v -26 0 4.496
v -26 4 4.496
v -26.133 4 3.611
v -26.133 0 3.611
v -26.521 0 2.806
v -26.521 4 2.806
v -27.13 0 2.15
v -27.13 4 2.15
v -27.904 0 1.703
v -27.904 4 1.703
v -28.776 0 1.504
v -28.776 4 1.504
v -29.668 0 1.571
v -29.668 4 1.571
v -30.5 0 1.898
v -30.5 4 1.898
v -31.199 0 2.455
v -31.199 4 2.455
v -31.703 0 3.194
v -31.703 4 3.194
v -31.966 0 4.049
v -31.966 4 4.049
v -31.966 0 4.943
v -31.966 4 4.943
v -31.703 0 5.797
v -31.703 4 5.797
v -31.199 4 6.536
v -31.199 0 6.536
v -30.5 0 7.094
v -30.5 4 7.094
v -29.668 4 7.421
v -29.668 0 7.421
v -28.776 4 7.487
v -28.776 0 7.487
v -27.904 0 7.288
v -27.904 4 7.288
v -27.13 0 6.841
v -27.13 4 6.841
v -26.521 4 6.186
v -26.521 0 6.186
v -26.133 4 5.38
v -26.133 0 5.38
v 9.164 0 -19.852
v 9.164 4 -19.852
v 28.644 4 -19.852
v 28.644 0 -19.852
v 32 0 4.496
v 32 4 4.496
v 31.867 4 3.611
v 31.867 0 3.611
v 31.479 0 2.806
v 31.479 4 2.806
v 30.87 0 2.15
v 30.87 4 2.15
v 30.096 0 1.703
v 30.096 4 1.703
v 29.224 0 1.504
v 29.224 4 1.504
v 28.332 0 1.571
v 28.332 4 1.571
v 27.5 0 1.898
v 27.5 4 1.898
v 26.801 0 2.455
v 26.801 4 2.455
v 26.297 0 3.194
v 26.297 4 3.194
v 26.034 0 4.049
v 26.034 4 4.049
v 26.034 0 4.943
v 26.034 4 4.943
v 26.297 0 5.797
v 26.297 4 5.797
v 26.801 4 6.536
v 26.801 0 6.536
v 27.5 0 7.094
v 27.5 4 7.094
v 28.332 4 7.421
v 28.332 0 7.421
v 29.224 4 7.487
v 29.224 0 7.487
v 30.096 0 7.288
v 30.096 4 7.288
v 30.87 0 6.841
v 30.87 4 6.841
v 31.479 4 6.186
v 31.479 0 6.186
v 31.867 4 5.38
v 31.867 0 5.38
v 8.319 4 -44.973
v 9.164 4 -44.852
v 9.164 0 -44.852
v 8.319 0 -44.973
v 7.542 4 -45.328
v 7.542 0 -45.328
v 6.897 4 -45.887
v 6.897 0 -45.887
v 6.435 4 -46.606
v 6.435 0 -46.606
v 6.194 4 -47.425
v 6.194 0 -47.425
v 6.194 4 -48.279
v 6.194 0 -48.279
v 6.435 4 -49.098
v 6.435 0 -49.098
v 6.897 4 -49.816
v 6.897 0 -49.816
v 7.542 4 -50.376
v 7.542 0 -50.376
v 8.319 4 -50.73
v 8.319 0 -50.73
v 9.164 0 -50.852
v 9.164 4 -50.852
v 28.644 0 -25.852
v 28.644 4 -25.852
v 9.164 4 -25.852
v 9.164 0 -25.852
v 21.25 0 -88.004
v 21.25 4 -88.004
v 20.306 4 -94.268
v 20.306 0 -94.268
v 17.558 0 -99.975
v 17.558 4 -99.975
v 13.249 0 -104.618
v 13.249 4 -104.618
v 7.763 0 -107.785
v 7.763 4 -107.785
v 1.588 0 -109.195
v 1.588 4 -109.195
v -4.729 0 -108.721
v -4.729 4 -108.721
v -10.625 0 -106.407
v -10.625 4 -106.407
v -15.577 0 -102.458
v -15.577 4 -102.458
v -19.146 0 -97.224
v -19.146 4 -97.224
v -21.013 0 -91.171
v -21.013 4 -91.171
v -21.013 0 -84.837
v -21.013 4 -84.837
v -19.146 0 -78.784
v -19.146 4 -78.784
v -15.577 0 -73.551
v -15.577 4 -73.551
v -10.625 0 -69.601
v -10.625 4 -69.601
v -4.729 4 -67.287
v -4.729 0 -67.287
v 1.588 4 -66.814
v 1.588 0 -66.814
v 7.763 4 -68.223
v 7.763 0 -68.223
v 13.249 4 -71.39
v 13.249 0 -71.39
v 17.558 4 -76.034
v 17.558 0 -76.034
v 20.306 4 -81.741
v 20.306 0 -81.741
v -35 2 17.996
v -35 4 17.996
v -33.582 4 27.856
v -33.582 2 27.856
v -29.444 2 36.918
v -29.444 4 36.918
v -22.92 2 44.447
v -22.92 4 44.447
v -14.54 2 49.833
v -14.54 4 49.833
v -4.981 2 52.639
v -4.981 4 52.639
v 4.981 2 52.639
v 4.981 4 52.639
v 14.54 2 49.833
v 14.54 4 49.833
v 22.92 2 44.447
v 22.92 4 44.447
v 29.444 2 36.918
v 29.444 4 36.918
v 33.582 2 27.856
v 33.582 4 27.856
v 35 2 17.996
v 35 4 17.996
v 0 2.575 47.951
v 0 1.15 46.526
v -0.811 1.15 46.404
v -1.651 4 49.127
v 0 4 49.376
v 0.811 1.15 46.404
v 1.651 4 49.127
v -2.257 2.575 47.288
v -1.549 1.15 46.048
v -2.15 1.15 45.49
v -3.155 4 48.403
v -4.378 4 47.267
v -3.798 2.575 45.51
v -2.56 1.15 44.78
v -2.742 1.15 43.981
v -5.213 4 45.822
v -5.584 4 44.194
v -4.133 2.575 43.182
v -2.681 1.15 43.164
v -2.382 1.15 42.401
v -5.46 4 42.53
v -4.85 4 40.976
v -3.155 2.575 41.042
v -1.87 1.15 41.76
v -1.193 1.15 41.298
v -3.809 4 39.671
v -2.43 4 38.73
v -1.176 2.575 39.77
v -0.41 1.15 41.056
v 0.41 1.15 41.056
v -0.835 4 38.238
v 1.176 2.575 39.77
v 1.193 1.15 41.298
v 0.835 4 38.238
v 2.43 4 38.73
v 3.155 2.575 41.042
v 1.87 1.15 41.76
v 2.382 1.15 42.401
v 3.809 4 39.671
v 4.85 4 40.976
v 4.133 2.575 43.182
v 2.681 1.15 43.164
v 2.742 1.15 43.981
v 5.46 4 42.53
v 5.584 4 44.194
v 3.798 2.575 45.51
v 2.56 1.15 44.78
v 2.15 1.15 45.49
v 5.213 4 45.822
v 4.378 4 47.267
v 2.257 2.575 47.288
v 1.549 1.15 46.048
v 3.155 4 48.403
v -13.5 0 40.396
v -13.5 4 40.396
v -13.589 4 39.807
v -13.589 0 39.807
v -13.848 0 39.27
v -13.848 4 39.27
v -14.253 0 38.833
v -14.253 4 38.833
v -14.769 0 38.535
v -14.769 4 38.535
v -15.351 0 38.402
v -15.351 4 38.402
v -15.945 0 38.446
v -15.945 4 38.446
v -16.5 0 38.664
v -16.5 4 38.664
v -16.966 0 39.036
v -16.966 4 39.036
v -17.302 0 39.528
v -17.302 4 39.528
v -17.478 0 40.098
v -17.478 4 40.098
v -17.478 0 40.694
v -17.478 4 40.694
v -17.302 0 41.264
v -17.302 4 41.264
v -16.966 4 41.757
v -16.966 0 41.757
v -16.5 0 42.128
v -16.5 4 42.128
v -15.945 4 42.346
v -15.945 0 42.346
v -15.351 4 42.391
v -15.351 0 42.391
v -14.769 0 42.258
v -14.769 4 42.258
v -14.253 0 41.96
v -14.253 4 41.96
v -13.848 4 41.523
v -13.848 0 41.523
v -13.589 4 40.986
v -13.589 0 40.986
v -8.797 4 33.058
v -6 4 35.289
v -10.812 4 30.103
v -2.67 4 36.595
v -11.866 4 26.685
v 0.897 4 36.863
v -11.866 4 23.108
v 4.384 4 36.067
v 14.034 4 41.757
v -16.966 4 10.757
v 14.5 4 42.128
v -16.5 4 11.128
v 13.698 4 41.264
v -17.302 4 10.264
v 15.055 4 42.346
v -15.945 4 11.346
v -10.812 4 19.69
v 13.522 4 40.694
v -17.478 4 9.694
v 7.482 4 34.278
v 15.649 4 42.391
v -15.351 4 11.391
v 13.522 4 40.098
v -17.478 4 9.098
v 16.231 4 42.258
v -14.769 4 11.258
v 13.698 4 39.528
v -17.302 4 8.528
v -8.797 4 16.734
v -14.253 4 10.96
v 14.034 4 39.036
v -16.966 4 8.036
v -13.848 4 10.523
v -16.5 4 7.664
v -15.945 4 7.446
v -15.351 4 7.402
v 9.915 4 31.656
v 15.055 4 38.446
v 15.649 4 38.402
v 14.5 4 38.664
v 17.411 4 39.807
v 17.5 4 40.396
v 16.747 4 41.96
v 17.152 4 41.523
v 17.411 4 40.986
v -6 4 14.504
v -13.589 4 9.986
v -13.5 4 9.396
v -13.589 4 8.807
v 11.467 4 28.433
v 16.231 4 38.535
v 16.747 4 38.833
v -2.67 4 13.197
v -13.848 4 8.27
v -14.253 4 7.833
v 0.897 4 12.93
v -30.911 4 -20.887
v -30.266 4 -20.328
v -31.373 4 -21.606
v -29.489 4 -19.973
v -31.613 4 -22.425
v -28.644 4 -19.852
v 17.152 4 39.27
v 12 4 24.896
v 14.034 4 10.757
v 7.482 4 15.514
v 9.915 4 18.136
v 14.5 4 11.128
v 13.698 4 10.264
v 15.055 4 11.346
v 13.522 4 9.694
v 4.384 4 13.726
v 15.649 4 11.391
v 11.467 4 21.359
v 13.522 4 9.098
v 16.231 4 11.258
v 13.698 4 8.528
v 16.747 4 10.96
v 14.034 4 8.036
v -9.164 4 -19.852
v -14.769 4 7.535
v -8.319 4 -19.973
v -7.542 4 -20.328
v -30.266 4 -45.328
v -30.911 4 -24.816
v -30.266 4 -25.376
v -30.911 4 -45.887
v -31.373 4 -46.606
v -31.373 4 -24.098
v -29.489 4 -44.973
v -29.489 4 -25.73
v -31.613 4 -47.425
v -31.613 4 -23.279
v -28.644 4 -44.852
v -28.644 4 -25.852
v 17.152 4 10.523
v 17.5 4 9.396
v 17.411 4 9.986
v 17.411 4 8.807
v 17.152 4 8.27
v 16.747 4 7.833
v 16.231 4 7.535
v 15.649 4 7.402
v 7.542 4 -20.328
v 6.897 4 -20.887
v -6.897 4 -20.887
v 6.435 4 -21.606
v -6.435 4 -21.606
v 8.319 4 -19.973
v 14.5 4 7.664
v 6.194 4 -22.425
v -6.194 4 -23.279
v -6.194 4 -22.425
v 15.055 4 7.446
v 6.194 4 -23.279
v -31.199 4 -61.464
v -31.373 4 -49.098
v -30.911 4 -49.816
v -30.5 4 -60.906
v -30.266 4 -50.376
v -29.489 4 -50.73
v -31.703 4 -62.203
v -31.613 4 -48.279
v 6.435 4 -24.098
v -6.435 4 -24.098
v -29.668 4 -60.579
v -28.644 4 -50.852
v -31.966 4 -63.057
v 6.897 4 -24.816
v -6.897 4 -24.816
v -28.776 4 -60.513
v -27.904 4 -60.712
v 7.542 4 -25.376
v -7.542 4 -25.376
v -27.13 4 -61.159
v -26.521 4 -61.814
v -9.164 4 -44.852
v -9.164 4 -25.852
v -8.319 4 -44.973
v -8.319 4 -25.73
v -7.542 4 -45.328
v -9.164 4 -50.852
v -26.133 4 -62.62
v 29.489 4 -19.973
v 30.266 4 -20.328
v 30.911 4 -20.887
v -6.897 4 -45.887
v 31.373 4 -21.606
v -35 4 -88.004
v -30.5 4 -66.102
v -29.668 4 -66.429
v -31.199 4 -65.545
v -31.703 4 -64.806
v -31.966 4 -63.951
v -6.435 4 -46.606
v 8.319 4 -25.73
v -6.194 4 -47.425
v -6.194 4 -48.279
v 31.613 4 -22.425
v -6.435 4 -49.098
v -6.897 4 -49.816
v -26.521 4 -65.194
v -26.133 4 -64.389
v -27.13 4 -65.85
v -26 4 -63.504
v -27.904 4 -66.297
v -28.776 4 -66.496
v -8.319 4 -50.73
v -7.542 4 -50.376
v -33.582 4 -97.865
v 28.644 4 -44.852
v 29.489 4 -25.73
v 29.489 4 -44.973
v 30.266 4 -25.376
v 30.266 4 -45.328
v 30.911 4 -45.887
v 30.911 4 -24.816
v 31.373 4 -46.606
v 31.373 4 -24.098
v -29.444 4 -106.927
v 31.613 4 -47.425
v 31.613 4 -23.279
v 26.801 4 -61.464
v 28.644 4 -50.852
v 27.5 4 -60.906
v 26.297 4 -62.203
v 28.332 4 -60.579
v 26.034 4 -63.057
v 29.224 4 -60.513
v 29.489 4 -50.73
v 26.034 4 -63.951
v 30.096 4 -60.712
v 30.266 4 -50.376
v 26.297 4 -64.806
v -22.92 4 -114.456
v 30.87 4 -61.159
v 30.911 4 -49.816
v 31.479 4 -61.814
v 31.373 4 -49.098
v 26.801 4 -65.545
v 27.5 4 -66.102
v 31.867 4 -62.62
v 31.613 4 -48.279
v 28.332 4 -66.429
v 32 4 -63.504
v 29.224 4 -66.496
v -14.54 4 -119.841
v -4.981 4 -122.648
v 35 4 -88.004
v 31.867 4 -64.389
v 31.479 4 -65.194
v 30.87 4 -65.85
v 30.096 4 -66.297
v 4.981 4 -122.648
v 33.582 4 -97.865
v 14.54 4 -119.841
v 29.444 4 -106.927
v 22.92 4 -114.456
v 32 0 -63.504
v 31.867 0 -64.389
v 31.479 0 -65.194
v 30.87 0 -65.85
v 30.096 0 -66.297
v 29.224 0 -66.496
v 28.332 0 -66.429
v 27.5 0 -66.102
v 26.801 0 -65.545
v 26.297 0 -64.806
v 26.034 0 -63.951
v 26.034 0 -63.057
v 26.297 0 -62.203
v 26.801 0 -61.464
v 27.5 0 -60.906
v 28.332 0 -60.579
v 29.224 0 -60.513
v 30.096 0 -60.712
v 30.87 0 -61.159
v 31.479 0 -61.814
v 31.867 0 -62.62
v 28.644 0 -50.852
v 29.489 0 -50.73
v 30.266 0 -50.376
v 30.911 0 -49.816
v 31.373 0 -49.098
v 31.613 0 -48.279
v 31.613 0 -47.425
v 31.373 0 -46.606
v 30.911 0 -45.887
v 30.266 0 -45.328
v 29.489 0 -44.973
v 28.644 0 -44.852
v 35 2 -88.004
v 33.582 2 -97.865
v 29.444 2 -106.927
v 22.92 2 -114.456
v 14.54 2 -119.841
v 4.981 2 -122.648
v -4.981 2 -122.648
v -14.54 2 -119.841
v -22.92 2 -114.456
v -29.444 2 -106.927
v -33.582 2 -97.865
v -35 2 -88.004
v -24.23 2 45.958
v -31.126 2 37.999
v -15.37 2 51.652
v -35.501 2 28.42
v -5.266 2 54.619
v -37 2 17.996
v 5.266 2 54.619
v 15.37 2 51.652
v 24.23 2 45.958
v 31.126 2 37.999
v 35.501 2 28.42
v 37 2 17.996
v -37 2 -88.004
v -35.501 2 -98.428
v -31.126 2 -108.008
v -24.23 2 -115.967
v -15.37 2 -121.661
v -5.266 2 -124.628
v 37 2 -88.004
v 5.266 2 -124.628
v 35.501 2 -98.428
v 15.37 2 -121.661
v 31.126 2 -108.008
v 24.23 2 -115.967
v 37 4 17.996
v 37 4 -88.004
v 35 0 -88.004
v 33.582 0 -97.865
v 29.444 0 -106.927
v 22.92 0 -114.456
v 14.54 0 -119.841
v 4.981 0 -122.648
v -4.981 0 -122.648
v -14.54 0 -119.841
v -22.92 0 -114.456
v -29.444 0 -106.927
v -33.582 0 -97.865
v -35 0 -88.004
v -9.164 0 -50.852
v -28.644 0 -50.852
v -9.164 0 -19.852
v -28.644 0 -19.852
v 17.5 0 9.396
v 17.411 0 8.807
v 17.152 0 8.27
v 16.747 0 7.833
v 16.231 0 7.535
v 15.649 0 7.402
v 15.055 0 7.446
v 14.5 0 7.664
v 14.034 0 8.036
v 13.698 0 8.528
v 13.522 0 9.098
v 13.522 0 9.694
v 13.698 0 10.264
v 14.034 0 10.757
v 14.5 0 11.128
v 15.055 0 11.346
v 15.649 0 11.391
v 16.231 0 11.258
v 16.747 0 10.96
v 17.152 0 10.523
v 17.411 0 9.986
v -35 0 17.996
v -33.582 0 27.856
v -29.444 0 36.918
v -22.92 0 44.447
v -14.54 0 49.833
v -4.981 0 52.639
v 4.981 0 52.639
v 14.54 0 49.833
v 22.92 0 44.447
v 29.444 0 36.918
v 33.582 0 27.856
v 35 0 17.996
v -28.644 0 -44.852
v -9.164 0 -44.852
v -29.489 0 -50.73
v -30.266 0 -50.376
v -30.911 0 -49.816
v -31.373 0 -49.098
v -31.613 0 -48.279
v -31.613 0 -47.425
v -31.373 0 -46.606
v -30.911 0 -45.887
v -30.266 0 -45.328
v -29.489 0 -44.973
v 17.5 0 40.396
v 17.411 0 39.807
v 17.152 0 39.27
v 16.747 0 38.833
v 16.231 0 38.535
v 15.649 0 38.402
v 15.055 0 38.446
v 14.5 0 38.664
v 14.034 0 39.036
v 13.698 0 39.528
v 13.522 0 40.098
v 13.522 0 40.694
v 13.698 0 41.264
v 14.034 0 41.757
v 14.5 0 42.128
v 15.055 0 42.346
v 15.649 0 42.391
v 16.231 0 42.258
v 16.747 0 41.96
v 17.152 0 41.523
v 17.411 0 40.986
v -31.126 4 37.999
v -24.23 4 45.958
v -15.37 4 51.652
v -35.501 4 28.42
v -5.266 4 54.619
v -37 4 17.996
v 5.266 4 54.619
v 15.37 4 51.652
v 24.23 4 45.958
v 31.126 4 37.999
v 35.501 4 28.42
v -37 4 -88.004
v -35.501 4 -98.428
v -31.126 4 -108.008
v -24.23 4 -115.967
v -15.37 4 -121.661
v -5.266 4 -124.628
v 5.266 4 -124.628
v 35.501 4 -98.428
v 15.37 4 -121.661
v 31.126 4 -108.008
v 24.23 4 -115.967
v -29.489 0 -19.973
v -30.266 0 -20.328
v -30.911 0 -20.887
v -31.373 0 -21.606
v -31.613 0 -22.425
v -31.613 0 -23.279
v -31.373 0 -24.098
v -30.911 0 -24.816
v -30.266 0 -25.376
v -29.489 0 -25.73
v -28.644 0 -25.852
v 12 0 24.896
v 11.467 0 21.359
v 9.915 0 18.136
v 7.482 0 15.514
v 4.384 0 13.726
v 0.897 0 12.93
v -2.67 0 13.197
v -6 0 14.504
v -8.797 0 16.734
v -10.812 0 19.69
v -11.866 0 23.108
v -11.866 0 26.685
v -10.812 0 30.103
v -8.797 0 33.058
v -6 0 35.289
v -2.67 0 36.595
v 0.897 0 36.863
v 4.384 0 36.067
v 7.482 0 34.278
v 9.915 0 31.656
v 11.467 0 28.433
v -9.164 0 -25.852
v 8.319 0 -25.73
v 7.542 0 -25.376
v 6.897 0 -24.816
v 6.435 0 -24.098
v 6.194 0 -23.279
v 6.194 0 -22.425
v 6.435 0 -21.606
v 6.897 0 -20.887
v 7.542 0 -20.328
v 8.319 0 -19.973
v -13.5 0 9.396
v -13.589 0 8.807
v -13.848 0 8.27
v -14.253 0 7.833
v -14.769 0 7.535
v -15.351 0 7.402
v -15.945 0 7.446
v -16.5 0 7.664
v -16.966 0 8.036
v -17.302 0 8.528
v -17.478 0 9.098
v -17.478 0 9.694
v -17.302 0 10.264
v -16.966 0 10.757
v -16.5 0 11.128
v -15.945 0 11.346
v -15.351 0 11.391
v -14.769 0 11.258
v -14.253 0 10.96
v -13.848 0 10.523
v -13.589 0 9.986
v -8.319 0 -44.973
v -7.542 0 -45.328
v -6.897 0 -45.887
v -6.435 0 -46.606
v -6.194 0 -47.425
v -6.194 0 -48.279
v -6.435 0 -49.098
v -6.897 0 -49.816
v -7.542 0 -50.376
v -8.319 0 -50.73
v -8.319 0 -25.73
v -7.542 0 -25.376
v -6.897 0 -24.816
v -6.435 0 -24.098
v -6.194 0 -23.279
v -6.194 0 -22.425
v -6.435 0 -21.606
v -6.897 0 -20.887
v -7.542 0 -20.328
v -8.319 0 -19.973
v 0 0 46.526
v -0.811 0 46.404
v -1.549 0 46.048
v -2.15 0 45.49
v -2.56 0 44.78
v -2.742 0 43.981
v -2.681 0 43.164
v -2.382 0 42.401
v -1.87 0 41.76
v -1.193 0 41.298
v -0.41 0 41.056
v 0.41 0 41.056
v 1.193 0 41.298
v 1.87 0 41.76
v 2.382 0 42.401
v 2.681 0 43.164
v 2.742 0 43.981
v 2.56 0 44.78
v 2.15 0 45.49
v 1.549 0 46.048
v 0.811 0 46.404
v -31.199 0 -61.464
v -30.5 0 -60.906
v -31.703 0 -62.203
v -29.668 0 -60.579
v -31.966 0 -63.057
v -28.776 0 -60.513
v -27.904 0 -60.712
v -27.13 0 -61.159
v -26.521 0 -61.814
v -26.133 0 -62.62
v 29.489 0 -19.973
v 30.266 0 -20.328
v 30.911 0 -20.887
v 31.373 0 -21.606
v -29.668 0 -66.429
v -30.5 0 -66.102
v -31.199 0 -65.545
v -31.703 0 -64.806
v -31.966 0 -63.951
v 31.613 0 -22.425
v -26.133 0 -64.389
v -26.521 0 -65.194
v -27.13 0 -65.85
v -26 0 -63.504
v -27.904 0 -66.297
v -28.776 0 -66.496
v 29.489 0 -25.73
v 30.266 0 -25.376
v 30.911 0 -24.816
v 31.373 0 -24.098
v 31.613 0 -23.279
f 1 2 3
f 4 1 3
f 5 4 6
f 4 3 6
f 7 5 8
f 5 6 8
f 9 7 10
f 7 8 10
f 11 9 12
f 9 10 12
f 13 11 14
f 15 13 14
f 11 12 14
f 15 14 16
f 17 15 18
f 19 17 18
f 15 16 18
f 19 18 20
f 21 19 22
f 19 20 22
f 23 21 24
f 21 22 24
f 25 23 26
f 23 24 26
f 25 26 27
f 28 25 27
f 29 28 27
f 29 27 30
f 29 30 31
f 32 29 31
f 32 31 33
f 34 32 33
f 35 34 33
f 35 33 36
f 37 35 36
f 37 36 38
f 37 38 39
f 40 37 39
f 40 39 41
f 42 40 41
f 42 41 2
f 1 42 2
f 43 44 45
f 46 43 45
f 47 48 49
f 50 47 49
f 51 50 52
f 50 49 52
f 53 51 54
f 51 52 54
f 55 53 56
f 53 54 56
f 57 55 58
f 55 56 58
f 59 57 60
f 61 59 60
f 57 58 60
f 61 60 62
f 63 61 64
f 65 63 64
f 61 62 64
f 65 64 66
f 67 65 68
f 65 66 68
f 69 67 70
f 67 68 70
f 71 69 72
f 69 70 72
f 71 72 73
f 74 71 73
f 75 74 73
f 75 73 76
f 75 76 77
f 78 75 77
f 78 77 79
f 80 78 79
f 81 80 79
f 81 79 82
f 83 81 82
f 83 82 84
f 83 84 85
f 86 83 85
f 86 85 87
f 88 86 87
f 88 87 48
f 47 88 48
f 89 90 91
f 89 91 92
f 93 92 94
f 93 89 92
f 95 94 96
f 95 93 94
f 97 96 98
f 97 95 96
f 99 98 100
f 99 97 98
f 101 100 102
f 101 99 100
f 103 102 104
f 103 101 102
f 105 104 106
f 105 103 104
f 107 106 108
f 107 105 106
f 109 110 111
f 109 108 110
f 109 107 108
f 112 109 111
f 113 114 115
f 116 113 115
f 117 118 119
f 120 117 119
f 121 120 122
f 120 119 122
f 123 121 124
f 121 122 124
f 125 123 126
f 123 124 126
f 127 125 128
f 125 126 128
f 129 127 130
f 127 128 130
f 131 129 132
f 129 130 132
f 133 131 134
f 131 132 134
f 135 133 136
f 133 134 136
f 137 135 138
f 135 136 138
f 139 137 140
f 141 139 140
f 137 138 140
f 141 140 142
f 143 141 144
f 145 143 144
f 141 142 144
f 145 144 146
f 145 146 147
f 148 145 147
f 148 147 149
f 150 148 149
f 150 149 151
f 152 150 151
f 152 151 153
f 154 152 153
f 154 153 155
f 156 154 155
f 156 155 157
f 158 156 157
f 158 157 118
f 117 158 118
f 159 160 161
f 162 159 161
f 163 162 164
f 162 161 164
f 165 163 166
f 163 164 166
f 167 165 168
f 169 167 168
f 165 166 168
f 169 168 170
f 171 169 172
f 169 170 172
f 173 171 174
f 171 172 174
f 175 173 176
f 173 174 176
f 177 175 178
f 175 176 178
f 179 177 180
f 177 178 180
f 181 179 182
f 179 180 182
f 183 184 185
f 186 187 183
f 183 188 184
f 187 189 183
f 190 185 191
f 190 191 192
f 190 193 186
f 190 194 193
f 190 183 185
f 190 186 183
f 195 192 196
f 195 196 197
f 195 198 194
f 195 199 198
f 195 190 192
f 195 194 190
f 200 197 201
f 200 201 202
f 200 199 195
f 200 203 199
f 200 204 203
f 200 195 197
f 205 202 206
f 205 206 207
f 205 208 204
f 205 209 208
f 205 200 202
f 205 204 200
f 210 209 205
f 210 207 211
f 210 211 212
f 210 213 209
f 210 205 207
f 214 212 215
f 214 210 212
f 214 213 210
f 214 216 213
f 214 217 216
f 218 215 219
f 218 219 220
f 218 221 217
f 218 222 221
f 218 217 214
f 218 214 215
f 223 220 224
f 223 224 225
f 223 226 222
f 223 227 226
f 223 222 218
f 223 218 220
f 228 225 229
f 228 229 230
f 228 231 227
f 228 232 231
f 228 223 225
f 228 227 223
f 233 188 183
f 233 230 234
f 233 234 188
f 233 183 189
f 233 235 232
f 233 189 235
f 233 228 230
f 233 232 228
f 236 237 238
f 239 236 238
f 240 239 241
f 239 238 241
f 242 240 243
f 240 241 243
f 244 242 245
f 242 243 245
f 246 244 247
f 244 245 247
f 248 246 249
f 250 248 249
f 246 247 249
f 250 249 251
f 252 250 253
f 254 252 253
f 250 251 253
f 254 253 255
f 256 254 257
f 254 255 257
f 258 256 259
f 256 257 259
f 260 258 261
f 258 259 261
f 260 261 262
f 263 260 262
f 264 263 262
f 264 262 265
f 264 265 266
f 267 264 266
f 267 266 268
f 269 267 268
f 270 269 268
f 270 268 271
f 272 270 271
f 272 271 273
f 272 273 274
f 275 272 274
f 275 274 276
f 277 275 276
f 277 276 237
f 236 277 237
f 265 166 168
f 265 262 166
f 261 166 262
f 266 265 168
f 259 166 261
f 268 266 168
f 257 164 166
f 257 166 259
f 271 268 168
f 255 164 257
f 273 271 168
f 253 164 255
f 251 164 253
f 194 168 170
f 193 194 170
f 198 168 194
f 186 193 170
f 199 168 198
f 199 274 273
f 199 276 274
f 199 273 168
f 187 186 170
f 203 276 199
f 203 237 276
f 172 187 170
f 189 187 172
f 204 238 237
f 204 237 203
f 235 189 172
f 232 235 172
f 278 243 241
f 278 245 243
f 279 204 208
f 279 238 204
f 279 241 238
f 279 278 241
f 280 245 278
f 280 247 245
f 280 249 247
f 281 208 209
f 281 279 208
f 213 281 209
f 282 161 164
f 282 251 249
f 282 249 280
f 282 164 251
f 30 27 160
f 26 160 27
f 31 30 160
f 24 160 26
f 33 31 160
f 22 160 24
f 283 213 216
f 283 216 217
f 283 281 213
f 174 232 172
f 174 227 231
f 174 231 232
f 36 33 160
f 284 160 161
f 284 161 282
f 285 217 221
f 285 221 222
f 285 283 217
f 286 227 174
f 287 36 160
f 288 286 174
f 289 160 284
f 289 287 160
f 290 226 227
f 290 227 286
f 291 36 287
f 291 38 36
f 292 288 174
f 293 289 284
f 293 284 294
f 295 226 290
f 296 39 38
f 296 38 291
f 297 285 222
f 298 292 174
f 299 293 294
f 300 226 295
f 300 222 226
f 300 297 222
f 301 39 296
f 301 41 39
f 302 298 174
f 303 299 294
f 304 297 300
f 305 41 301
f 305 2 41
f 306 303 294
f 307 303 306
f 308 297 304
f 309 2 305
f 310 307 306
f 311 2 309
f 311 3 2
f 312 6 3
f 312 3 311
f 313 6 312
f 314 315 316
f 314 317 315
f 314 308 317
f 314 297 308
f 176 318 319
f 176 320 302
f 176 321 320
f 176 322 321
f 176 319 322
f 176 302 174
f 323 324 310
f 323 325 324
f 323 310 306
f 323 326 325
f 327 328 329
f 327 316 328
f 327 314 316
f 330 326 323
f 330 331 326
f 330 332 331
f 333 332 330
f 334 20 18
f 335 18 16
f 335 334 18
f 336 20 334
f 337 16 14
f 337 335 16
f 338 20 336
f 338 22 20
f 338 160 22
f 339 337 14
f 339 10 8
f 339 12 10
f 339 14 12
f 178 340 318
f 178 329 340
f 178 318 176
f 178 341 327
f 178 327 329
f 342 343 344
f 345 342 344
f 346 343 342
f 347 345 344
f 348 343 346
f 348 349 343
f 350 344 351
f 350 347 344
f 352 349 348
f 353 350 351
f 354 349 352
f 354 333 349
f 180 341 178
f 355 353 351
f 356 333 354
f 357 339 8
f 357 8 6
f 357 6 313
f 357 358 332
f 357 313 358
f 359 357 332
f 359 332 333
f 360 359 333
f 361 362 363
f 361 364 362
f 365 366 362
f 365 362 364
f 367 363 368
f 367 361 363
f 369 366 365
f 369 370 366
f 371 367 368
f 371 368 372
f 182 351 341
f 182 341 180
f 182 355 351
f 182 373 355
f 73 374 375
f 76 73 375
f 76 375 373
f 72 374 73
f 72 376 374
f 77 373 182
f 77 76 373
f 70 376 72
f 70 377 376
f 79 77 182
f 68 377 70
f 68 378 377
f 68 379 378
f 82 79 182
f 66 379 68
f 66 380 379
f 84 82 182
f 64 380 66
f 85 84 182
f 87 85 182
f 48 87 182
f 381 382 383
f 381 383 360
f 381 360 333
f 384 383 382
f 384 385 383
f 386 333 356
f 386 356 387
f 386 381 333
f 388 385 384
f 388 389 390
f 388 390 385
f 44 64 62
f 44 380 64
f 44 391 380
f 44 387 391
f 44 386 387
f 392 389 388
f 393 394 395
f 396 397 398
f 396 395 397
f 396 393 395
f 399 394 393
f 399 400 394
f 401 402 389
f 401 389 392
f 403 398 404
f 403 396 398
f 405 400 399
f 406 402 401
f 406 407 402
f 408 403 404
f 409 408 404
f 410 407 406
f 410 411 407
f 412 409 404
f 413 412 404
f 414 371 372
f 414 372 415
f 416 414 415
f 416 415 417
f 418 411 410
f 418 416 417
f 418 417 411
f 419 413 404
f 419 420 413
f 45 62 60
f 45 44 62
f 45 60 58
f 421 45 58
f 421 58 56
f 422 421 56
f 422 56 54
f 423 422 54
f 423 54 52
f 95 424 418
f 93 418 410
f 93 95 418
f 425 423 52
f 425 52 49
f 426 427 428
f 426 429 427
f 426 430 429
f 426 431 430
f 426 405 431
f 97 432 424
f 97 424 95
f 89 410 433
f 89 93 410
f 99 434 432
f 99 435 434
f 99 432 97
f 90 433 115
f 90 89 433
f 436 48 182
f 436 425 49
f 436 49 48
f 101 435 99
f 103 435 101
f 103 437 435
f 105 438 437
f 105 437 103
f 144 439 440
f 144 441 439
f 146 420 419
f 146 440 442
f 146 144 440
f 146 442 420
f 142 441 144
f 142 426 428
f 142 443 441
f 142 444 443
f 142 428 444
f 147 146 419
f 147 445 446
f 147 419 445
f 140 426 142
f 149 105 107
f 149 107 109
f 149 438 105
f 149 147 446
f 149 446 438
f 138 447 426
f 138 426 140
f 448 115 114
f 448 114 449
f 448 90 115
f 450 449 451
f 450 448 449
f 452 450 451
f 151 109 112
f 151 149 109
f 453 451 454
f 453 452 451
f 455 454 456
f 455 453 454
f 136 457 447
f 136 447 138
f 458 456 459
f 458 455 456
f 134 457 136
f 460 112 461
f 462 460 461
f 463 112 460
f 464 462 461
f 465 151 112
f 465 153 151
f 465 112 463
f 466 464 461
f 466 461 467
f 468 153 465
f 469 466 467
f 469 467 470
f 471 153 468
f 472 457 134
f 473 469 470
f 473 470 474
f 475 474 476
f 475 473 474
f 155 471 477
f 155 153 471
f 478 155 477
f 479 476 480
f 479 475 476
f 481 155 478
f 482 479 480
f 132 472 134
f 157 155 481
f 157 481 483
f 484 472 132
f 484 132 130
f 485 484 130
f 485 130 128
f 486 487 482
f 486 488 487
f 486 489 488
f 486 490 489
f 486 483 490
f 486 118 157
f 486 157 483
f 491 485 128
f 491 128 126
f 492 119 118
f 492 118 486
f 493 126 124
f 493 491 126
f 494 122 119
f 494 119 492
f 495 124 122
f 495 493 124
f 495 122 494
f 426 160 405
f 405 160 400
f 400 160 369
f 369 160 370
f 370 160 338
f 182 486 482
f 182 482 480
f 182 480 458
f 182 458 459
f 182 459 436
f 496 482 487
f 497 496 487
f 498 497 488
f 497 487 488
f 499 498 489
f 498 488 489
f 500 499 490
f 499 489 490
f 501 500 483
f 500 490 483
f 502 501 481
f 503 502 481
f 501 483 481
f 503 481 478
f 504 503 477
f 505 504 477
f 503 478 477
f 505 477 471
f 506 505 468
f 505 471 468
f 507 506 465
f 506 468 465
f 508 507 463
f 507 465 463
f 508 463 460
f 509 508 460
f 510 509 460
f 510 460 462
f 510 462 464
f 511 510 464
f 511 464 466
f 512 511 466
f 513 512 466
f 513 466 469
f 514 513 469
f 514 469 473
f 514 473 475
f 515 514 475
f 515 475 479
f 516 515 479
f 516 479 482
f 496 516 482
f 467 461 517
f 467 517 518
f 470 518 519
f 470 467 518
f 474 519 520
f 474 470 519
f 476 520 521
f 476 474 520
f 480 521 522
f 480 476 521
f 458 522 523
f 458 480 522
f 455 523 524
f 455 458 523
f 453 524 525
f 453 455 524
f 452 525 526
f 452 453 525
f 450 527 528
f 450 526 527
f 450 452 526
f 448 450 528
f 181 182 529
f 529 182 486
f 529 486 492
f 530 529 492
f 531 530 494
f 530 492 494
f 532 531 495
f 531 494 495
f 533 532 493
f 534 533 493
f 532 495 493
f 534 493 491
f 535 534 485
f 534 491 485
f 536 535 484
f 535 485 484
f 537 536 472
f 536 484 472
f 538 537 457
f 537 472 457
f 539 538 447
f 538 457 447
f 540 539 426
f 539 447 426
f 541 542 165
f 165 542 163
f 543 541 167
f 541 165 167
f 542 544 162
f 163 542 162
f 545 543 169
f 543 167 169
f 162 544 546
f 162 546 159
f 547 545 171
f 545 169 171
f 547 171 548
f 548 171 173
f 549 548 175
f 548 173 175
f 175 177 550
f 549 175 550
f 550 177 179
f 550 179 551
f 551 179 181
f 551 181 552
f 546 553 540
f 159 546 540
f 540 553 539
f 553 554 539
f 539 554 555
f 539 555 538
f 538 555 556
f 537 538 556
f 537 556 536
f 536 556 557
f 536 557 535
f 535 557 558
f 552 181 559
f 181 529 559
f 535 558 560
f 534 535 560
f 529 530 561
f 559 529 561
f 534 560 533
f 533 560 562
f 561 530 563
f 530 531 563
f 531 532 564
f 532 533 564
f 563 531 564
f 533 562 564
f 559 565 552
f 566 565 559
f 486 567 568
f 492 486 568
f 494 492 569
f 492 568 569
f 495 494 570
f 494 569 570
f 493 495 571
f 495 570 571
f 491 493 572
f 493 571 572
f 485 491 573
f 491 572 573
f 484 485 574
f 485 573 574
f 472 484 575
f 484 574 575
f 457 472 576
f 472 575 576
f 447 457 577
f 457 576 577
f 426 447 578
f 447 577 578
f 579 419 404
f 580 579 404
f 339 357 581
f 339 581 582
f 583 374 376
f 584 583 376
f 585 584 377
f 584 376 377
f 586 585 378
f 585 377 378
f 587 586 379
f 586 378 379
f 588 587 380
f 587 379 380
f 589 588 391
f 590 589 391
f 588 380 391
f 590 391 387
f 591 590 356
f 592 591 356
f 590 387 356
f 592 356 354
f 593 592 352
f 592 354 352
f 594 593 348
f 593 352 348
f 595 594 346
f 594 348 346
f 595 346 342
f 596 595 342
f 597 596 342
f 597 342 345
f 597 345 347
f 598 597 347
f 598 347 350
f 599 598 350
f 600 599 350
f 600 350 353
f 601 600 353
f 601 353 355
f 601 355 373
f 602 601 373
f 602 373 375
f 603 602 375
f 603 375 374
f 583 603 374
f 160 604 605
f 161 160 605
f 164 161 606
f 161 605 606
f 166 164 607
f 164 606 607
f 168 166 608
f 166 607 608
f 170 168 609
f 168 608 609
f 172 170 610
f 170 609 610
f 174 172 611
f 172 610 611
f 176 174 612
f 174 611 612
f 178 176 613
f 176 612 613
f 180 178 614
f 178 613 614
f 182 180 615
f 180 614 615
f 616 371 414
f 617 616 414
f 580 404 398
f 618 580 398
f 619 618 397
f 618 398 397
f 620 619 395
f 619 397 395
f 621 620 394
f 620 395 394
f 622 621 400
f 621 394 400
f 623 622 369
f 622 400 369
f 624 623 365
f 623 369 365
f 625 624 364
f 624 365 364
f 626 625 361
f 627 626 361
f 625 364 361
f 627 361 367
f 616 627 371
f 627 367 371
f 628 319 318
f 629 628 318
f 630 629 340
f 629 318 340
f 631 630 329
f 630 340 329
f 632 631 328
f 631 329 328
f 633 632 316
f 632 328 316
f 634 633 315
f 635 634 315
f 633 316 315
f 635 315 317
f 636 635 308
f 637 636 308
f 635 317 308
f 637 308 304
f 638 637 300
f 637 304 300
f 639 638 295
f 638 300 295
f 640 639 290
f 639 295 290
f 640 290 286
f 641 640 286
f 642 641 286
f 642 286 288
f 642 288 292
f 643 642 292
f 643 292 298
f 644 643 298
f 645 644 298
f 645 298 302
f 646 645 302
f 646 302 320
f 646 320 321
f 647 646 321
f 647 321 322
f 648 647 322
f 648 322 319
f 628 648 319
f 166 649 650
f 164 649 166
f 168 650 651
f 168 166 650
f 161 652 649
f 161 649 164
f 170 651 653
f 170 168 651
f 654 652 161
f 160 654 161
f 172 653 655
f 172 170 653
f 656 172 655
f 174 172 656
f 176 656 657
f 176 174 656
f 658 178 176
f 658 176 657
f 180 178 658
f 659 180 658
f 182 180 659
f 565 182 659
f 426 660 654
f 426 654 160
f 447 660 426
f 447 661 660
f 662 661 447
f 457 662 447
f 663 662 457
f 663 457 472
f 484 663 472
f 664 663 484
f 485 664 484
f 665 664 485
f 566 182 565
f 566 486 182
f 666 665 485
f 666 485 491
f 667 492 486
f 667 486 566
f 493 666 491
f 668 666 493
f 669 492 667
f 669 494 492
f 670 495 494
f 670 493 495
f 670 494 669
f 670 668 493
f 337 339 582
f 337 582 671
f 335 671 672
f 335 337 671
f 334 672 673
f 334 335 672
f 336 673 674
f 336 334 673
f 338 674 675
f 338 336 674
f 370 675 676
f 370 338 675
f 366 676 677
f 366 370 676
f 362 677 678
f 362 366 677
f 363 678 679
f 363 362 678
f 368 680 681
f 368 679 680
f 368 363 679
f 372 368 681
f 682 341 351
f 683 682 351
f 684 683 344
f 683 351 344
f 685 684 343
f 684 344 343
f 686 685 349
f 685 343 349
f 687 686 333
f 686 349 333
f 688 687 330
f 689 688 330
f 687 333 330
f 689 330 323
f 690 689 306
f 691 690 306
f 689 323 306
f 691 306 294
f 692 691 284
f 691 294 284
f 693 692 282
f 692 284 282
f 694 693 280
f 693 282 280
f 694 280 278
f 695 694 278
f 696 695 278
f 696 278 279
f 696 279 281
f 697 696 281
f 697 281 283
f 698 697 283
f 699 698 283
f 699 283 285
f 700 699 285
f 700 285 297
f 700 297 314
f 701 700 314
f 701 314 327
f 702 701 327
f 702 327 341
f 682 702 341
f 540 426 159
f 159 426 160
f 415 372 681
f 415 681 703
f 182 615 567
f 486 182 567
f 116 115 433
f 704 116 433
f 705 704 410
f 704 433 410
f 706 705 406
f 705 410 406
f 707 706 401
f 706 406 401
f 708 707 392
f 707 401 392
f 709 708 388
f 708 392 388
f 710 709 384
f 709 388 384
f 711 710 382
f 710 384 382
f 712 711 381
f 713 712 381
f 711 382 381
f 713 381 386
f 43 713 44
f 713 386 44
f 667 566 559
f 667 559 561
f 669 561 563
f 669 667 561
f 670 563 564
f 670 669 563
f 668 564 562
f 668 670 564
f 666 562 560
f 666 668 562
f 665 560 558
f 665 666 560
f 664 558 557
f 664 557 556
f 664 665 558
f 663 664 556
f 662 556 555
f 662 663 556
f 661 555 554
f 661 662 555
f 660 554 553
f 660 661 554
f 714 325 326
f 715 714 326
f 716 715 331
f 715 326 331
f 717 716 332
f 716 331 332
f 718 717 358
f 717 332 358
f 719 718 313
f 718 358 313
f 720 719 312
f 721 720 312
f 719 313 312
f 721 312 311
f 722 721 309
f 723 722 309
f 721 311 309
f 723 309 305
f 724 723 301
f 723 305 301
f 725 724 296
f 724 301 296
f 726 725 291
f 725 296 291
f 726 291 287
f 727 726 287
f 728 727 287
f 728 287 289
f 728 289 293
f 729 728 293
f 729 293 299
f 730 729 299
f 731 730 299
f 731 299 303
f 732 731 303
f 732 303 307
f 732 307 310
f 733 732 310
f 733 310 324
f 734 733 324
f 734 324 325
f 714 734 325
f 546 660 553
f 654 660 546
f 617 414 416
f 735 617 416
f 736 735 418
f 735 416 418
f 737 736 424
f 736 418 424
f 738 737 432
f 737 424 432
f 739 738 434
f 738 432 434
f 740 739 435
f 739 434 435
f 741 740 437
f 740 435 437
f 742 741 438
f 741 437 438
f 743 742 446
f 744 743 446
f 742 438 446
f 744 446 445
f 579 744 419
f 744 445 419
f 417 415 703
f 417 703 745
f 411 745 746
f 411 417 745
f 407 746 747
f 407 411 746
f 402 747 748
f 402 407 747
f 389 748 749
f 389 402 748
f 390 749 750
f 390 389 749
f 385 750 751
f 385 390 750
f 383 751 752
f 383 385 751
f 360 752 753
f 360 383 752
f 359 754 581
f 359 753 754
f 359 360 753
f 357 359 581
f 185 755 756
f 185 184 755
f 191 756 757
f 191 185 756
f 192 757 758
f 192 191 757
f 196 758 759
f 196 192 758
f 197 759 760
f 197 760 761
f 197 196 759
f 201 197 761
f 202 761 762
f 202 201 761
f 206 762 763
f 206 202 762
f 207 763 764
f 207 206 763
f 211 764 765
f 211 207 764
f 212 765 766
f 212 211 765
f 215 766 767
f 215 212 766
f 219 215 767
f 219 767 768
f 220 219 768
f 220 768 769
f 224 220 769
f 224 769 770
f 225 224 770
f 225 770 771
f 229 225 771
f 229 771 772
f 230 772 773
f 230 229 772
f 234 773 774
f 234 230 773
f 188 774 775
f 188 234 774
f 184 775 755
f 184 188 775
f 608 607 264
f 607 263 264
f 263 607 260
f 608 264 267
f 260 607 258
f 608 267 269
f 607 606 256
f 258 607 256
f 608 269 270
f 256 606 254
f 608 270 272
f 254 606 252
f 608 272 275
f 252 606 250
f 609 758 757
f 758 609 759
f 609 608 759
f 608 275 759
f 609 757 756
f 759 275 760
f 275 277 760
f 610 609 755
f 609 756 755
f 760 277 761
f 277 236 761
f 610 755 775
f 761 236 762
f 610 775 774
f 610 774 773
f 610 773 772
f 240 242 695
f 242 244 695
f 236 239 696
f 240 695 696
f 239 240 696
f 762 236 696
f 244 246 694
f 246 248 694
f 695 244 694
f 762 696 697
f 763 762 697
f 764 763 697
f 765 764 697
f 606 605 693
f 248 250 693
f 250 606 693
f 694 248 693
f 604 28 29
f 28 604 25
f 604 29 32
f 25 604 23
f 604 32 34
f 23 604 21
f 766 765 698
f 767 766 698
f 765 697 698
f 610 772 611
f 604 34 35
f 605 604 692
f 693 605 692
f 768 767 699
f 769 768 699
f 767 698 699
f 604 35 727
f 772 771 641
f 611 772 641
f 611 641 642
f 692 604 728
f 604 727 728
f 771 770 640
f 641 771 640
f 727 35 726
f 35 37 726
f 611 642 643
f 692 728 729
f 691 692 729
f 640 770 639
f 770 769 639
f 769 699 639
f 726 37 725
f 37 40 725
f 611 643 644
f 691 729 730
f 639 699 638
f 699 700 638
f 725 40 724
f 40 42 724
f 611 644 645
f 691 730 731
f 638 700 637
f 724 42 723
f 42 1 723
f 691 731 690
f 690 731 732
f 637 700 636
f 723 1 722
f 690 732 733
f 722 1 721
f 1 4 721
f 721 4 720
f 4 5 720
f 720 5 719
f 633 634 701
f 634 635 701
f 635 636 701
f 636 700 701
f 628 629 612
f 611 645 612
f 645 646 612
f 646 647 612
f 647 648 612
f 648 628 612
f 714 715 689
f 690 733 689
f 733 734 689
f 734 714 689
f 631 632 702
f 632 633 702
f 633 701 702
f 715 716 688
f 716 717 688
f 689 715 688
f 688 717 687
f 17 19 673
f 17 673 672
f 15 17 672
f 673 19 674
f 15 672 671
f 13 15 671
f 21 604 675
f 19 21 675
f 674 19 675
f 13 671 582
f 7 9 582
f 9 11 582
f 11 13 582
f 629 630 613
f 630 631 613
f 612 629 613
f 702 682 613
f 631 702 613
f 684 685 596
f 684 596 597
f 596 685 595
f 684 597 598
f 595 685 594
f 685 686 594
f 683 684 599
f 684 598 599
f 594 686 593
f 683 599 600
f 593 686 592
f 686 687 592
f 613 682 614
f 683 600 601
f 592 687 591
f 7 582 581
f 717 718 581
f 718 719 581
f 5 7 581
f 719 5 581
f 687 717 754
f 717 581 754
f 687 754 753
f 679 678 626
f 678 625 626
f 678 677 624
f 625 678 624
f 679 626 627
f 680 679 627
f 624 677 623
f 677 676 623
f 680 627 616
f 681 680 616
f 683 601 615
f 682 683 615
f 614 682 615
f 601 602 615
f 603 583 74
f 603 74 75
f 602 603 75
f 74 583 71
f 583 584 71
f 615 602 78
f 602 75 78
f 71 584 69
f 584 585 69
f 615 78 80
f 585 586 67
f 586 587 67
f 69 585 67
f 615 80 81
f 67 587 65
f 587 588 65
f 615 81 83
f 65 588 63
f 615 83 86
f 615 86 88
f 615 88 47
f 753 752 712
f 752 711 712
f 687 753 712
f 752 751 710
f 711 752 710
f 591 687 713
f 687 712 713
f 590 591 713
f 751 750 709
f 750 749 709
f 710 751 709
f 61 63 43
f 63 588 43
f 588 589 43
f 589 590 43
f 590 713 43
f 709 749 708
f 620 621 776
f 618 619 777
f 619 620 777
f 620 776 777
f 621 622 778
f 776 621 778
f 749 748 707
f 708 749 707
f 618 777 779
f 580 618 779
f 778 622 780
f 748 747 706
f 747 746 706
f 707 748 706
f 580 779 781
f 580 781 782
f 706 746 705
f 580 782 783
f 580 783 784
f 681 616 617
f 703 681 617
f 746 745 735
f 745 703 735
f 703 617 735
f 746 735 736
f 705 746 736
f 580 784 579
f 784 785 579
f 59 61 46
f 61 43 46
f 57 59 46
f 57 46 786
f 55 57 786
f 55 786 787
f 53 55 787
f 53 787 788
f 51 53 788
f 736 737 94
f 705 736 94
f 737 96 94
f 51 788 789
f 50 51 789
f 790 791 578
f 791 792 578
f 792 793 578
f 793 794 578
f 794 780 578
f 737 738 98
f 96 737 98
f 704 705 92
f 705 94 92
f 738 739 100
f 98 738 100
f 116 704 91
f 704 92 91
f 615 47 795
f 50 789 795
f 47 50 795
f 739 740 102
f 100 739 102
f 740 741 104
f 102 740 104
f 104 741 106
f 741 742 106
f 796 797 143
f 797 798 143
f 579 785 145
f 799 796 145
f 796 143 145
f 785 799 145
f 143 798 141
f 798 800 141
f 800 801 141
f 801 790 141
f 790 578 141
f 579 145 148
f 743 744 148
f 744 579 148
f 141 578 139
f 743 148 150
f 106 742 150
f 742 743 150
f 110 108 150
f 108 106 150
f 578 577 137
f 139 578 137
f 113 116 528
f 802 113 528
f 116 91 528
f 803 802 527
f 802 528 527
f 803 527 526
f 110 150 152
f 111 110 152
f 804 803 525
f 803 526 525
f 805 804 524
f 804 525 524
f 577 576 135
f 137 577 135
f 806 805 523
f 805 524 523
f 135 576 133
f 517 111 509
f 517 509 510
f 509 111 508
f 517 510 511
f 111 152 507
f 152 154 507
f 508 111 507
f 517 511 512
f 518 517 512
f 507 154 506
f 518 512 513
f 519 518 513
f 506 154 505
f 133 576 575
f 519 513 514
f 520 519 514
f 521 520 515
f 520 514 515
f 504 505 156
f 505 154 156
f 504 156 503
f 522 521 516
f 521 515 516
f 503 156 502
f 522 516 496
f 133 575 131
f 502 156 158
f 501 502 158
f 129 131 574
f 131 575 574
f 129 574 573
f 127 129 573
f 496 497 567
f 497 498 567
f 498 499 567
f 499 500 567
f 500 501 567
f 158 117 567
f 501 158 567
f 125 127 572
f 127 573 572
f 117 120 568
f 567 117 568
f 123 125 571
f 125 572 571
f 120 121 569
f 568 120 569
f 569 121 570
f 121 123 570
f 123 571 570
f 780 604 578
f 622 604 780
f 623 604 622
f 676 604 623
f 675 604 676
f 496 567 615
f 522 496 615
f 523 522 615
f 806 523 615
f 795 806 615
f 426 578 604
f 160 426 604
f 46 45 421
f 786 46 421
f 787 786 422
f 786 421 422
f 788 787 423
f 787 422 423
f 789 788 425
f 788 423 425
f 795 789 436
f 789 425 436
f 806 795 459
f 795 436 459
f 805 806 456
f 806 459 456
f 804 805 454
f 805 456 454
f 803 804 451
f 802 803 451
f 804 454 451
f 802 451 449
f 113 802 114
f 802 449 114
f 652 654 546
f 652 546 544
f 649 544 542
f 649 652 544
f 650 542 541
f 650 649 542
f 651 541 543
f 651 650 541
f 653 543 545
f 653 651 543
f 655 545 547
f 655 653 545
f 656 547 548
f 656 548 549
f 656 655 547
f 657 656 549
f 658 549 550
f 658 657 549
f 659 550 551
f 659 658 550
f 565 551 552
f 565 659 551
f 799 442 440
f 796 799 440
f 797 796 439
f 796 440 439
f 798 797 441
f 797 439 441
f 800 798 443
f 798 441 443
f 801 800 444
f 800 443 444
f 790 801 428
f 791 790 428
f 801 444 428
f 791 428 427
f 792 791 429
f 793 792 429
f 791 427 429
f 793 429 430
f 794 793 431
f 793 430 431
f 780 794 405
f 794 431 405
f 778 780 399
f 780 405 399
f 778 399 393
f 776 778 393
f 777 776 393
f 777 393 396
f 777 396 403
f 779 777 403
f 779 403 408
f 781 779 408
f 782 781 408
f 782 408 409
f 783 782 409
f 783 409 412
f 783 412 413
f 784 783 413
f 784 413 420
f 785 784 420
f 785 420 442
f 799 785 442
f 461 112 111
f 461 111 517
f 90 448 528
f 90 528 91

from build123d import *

# Parameters (mm, degrees)
SALIENTE_EXTRUIR1_DEPTH = 4
SALIENTE_EXTRUIR2_DEPTH = 2
CROQUIS4_R              = 3
CROQUIS4_R_2            = 21.25
CROQUIS4_R_3            = 12
CROQUIS4_R_4            = 2
CORTAR_EXTRUIR1_DEPTH   = 10
CORTAR_EXTRUIR2_DEPTH   = 10


with BuildPart() as part:
    # Croquis1 → Saliente-Extruir1 (new body)
    with BuildSketch(Plane(origin=(0, 0, 0), x_dir=(1, 0, 0), z_dir=(0, 1, 0))):
        with BuildLine():
            Line((-35, 88.004281691), (-35, -17.995718309))
            ThreePointArc((-35, -17.995718309), (0, -52.995718309), (35, -17.995718309))
            Line((35, -17.995718309), (35, 88.004281691))
            ThreePointArc((35, 88.004281691), (0, 123.004281691), (-35, 88.004281691))
        make_face()
    extrude(amount=SALIENTE_EXTRUIR1_DEPTH)

    # Croquis4 → Cortar-Extruir1 (cut)
    with BuildSketch(Plane(origin=(0, 4, 0), x_dir=(1, 0, 0), z_dir=(0, 1, 0))):
        with Locations((-29, 63.504281691)):
            Circle(CROQUIS4_R)
        with Locations((-29, -4.495718309)):
            Circle(CROQUIS4_R)
        with Locations((29, -4.495718309)):
            Circle(CROQUIS4_R)
        with Locations((29, 63.504281691)):
            Circle(CROQUIS4_R)
        with Locations((0, 88.004281691)):
            Circle(CROQUIS4_R_2)
        with Locations((0, -24.896258099)):
            Circle(CROQUIS4_R_3)
        with Locations((-15.5, -9.396258099)):
            Circle(CROQUIS4_R_4)
        with Locations((-15.5, -40.396258099)):
            Circle(CROQUIS4_R_4)
        with Locations((15.5, -9.396258099)):
            Circle(CROQUIS4_R_4)
        with Locations((15.5, -40.396258099)):
            Circle(CROQUIS4_R_4)
    extrude(amount=-CORTAR_EXTRUIR1_DEPTH, mode=Mode.SUBTRACT)

    # Croquis10 → Refrentado para tornillo tapón con cabeza plana de clavija de M51 (revolve, cut)
    with BuildSketch(Plane(origin=(0, 4, 43.775718309), x_dir=(0, 0, 1), z_dir=(1, 0, 0))):
        Polygon((0, 0), (0, 4), (2.75, 4), (2.75, 2.85), (5.6, 0), align=None)
    revolve(axis=Axis((0, 10.35, 43.775718309), (0, -1, 0)), mode=Mode.SUBTRACT)

    # Croquis12 → Cortar-Extruir2 (cut)
    with BuildSketch(Plane(origin=(0, 4, 0), x_dir=(1, 0, 0), z_dir=(0, 1, 0))):
        with BuildLine():
            Line((-28.643878295, 25.851786669), (-9.163878295, 25.851786669))
            ThreePointArc((-9.163878295, 25.851786669), (-6.163878295, 22.851786669), (-9.163878295, 19.851786669))
            Line((-9.163878295, 19.851786669), (-28.643878295, 19.851786669))
            ThreePointArc((-28.643878295, 19.851786669), (-31.643878295, 22.851786669), (-28.643878295, 25.851786669))
        make_face()
        with BuildLine():
            Line((-28.643878295, 44.851786669), (-9.163878295, 44.851786669))
            ThreePointArc((-9.163878295, 44.851786669), (-6.163878295, 47.851786669), (-9.163878295, 50.851786669))
            Line((-9.163878295, 50.851786669), (-28.643878295, 50.851786669))
            ThreePointArc((-28.643878295, 50.851786669), (-31.643878295, 47.851786669), (-28.643878295, 44.851786669))
        make_face()
        with BuildLine():
            Line((28.643878295, 25.851786669), (9.163878295, 25.851786669))
            ThreePointArc((9.163878295, 25.851786669), (6.163878295, 22.851786669), (9.163878295, 19.851786669))
            Line((9.163878295, 19.851786669), (28.643878295, 19.851786669))
            ThreePointArc((28.643878295, 19.851786669), (31.643878295, 22.851786669), (28.643878295, 25.851786669))
        make_face()
        with BuildLine():
            Line((28.643878295, 44.851786669), (9.163878295, 44.851786669))
            ThreePointArc((9.163878295, 44.851786669), (6.163878295, 47.851786669), (9.163878295, 50.851786669))
            Line((9.163878295, 50.851786669), (28.643878295, 50.851786669))
            ThreePointArc((28.643878295, 50.851786669), (31.643878295, 47.851786669), (28.643878295, 44.851786669))
        make_face()
    extrude(amount=-CORTAR_EXTRUIR2_DEPTH, mode=Mode.SUBTRACT)


with BuildPart() as body_2:
    # Croquis3 → Saliente-Extruir2 (new body)
    with BuildSketch(Plane(origin=(0, 4, 0), x_dir=(1, 0, 0), z_dir=(0, 1, 0))):
        with BuildLine():
            Line((-37, 88.004281691), (-37, -17.995718309))
            ThreePointArc((-37, -17.995718309), (0, -54.995718309), (37, -17.995718309))
            Line((37, -17.995718309), (37, 88.004281691))
            ThreePointArc((37, 88.004281691), (0, 125.004281691), (-37, 88.004281691))
        make_face()
        with BuildLine():
            Line((-35, 88.004281691), (-35, -17.995718309))
            ThreePointArc((-35, -17.995718309), (0, -52.995718309), (35, -17.995718309))
            Line((35, -17.995718309), (35, 88.004281691))
            ThreePointArc((35, 88.004281691), (0, 123.004281691), (-35, 88.004281691))
        make_face(mode=Mode.SUBTRACT)
    extrude(amount=-SALIENTE_EXTRUIR2_DEPTH)


solid = Compound([part.part, body_2.part])
